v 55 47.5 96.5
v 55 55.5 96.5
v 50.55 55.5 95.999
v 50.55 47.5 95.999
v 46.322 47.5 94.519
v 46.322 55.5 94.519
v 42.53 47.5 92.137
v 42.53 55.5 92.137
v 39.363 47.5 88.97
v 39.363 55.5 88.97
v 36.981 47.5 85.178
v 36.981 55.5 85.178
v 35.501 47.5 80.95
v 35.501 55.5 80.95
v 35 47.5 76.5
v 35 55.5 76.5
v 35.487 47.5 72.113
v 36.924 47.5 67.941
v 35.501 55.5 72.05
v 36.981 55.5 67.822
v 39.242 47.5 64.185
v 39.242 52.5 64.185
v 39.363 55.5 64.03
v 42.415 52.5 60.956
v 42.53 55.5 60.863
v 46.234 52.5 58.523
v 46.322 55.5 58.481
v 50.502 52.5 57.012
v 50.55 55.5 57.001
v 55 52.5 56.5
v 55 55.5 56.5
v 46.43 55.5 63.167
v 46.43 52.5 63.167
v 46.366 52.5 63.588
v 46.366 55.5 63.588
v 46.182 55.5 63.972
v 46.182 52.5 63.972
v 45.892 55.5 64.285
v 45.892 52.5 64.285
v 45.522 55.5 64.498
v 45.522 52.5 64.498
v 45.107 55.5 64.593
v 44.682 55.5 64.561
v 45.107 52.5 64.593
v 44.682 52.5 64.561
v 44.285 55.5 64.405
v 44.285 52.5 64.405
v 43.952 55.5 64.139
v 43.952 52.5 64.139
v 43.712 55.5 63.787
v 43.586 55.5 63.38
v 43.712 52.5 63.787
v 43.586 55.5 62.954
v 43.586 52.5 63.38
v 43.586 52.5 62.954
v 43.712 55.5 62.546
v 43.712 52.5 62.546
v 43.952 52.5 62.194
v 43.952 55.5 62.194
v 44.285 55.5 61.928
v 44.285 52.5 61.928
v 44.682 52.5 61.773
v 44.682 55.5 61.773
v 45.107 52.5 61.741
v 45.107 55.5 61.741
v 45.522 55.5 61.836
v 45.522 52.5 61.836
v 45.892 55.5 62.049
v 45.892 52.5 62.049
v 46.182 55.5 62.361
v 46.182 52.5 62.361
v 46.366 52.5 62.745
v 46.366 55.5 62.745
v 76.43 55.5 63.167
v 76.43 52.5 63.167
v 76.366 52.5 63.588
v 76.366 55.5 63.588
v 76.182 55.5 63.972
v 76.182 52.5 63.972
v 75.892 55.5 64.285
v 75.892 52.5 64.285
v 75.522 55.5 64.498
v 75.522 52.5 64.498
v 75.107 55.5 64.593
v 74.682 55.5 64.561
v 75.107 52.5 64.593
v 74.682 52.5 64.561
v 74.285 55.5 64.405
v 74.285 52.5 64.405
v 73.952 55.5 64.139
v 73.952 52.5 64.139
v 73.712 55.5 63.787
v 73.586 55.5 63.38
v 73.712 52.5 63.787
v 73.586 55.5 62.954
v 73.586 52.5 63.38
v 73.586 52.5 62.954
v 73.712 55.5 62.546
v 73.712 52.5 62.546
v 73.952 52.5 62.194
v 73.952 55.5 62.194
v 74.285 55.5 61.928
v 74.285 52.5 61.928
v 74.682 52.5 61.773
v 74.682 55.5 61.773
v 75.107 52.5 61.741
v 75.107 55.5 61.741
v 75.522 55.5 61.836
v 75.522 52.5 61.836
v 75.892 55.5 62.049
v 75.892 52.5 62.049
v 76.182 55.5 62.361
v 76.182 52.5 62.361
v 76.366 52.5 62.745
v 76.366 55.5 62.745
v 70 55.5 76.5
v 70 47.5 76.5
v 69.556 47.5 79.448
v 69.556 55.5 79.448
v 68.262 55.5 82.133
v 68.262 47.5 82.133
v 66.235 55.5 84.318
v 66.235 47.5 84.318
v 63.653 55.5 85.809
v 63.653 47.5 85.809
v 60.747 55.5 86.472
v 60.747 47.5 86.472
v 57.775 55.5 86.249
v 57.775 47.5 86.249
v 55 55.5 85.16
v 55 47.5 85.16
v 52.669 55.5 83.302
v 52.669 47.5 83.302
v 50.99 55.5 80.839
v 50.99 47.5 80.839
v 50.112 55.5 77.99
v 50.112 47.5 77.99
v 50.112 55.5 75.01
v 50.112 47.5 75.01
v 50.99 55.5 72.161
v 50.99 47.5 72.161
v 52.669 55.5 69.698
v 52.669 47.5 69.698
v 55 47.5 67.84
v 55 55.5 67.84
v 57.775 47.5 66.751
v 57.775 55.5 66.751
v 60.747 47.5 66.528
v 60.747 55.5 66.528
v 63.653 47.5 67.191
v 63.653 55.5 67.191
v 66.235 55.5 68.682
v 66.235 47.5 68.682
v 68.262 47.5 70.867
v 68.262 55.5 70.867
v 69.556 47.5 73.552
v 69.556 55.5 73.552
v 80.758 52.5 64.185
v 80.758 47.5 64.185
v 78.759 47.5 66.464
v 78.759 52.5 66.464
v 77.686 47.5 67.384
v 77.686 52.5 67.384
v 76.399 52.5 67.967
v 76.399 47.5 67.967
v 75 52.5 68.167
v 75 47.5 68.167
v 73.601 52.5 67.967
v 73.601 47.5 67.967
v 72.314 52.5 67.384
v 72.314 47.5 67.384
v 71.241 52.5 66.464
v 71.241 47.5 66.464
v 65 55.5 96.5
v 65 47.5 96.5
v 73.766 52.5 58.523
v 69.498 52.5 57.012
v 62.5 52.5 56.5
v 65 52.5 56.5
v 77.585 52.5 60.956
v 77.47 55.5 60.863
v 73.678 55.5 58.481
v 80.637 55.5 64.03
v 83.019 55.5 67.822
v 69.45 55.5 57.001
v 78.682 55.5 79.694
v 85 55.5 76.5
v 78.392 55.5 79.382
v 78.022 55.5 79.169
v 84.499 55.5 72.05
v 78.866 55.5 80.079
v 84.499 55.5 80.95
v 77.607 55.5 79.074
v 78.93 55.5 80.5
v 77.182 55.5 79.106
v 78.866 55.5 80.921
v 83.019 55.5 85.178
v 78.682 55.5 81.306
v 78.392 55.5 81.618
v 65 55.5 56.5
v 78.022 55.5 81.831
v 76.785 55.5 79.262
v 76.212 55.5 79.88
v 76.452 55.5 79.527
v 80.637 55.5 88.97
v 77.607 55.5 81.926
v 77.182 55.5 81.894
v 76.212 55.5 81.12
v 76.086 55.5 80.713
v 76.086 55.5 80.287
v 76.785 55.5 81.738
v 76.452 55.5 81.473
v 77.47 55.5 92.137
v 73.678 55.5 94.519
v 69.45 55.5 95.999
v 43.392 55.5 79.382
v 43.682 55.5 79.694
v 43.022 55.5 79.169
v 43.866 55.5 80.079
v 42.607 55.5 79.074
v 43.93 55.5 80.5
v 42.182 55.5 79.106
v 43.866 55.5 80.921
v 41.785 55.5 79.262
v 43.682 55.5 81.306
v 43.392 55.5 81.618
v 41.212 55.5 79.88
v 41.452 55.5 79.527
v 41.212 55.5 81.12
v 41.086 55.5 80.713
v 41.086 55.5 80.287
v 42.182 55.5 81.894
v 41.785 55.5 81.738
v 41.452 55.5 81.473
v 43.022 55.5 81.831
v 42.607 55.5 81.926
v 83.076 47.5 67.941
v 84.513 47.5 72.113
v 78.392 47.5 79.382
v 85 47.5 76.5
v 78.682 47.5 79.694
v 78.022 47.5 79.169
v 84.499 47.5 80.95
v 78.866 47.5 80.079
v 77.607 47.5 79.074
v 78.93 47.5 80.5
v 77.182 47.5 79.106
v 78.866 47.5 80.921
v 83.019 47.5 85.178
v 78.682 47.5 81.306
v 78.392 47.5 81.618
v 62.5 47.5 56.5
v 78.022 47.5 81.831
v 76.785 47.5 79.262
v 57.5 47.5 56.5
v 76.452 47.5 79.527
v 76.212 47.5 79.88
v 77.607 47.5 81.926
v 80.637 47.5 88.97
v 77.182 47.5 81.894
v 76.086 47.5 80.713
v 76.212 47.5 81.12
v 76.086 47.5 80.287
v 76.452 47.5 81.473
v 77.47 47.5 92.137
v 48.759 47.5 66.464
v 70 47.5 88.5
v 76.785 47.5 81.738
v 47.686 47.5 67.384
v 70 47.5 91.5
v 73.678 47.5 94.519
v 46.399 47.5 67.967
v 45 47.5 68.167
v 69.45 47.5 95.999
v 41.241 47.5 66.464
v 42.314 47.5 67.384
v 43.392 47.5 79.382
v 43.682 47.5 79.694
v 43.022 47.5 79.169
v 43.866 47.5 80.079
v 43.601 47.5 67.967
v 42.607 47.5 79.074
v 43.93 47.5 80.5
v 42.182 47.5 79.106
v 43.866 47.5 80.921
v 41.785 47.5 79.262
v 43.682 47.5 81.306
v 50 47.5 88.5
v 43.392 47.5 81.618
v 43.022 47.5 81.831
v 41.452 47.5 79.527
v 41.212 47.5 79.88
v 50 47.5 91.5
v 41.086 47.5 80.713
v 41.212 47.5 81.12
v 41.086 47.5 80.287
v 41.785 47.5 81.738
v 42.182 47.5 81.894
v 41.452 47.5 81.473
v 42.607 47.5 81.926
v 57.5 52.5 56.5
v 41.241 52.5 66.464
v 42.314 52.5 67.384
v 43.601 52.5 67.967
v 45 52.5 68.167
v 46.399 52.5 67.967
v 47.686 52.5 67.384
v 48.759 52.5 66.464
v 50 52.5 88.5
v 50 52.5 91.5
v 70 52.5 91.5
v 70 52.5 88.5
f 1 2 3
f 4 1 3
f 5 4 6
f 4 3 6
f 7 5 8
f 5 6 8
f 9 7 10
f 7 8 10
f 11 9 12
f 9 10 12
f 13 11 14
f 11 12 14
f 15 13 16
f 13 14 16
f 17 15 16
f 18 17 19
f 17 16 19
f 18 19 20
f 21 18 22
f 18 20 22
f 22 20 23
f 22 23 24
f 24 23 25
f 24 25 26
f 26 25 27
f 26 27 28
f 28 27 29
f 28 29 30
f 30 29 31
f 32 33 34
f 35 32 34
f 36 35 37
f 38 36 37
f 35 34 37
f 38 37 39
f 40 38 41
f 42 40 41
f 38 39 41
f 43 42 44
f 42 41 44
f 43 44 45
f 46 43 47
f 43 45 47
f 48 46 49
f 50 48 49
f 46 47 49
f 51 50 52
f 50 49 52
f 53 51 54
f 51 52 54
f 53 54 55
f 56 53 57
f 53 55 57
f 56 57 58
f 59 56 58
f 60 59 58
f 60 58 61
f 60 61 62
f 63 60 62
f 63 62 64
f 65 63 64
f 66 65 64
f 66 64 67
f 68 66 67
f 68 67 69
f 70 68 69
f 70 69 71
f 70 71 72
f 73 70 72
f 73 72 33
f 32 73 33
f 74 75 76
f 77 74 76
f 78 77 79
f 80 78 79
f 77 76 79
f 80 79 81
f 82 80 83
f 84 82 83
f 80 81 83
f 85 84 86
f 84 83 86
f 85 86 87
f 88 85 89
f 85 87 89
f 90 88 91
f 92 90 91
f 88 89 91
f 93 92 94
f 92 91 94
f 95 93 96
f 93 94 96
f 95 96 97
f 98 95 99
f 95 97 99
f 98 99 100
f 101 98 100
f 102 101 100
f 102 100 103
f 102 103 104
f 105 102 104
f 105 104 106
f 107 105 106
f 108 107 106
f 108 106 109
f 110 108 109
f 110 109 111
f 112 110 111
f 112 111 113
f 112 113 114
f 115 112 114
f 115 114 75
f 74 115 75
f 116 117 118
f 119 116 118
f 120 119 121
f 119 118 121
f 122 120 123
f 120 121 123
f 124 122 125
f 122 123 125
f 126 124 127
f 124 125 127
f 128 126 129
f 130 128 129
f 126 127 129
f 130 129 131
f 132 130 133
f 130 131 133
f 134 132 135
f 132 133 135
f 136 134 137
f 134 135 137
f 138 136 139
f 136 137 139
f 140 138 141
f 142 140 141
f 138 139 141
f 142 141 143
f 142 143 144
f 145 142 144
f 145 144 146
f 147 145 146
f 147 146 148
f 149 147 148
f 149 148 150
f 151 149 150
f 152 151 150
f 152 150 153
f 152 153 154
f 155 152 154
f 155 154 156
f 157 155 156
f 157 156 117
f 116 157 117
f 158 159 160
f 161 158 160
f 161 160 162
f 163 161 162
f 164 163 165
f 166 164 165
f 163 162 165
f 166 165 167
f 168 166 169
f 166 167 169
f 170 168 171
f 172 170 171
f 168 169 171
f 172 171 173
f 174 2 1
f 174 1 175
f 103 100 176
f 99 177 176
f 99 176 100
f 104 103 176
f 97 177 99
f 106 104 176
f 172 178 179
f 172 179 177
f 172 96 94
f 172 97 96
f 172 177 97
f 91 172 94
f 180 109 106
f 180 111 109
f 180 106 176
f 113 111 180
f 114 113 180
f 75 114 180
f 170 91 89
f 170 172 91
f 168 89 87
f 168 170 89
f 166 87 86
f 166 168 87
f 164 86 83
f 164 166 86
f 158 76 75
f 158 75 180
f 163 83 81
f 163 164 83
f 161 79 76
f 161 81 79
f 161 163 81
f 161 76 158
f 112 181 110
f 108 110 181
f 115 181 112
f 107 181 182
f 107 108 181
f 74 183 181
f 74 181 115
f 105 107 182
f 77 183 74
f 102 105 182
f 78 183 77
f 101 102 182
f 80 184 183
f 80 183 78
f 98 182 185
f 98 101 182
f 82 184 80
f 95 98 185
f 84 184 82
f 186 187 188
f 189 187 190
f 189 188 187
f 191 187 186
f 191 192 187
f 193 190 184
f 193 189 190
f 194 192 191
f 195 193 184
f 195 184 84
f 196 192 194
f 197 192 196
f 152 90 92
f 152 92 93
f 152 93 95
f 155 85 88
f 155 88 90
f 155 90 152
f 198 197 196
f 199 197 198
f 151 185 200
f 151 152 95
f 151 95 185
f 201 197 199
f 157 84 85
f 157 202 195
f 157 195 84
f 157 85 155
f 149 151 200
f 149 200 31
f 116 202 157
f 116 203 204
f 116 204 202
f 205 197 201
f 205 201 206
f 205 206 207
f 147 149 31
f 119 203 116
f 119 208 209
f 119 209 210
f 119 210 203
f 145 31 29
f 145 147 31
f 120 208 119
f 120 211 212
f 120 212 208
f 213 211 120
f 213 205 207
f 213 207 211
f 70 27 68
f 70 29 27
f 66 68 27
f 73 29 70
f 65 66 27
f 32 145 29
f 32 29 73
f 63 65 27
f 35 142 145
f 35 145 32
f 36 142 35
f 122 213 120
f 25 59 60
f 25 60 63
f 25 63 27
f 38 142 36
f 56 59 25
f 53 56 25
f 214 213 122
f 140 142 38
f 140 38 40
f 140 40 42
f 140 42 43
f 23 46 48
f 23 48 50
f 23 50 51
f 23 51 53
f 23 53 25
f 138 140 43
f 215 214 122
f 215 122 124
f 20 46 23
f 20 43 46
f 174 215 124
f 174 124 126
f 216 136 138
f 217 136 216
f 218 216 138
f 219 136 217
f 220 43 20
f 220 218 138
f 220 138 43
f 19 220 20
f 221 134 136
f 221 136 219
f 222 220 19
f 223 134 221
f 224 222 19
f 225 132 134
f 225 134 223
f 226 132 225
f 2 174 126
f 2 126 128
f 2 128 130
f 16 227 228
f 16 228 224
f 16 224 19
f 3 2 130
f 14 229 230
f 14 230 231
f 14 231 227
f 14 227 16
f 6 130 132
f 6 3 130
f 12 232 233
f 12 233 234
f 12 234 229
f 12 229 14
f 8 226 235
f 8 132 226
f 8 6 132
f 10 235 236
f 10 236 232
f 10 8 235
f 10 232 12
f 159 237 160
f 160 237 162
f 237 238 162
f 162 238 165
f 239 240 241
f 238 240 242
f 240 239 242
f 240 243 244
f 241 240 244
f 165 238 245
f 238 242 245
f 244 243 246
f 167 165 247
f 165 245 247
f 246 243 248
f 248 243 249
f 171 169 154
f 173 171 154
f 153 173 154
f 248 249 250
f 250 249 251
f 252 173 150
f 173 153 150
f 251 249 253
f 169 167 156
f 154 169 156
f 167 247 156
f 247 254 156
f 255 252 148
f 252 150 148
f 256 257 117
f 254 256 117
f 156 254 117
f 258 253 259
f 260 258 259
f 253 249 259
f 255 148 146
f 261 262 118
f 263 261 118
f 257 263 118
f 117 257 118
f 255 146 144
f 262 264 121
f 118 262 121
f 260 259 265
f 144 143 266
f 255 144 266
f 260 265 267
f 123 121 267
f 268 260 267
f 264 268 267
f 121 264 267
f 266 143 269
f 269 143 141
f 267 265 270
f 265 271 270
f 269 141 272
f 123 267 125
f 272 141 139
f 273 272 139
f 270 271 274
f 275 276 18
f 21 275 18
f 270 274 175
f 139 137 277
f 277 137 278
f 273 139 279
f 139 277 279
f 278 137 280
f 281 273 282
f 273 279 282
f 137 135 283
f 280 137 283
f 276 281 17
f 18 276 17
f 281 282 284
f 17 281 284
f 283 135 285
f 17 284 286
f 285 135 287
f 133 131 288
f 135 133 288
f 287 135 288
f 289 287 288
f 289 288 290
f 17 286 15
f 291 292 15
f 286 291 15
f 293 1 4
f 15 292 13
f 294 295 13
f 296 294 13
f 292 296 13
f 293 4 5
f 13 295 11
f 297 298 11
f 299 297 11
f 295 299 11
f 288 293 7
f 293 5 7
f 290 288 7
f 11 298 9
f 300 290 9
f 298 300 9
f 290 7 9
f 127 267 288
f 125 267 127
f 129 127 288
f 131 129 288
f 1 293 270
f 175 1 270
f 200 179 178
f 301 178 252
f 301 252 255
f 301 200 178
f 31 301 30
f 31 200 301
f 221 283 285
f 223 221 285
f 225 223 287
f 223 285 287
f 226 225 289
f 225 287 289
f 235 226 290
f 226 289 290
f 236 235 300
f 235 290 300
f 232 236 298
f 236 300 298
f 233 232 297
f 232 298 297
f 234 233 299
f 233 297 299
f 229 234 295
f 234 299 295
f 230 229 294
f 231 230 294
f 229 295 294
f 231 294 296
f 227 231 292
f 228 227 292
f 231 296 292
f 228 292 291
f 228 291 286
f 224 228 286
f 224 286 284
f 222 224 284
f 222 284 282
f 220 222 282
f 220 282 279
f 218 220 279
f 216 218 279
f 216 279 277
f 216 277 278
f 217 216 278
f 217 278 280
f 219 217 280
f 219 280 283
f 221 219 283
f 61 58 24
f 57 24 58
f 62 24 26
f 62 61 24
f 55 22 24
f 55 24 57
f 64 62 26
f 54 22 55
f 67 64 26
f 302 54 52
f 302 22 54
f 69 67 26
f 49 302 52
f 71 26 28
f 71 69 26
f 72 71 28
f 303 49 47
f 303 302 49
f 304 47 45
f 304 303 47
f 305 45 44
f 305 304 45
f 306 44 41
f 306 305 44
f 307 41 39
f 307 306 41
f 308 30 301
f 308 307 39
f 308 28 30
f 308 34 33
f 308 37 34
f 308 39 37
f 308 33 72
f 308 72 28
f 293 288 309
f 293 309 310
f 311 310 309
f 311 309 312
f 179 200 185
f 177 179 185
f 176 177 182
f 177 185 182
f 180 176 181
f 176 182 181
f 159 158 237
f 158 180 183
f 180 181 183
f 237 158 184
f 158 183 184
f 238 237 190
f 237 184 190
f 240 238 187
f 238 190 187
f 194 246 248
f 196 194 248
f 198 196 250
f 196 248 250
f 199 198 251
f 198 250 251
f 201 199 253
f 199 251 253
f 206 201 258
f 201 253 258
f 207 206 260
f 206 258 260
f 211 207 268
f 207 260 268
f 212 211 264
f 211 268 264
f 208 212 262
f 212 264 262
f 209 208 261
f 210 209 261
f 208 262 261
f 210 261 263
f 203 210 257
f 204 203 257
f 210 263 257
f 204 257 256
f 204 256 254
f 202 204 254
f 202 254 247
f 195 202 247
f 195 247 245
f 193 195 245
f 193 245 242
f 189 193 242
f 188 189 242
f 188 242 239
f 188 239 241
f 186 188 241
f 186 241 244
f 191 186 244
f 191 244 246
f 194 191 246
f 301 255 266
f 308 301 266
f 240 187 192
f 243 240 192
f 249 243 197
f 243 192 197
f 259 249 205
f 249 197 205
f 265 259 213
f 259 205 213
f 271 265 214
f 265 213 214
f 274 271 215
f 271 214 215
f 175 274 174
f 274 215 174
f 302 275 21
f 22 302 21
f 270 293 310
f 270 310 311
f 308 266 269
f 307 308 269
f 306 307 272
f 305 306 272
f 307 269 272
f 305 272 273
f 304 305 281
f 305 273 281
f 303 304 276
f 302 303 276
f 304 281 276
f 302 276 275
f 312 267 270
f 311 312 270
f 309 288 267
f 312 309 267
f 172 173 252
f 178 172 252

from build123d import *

# Parameters (mm, degrees)
PAD005_DEPTH    = 8
SKETCH018_W     = 20
SKETCH018_H     = 3
POCKET011_DEPTH = 5
SKETCH019_R     = 10
SKETCH019_R_2   = 1.43
POCKET012_DEPTH = 10


with BuildPart() as part:
    # Sketch017 → Pad005 (new body)
    with BuildSketch(Plane.XZ):
        with BuildLine():
            Line((-4.99996, 20), (4.99996, 20))
            ThreePointArc((25, 0), (19.142122, 14.14215), (4.99996, 20))
            ThreePointArc((4.99996, -20), (19.142122, -14.14215), (25, 0))
            Line((4.99996, -20), (-4.99996, -20))
            ThreePointArc((-25, 0), (-19.142122, -14.14215), (-4.99996, -20))
            ThreePointArc((-4.99996, 20), (-19.142122, 14.14215), (-25, 0))
        make_face()
    extrude(amount=PAD005_DEPTH)

    # Sketch018 (on Face8 of Pad005) → Pocket011 (cut)
    with BuildSketch(Plane.XZ.offset(8)):
        with BuildLine():
            ThreePointArc((-11.241388, -10.035935), (-15, -8.333333), (-18.758612, -10.035935))
            Line((-18.758612, -10.035935), (-27.5, -20))
            ThreePointArc((-27.5, -20), (-15, -47.594619), (-2.5, -20))
            Line((-2.5, -20), (-11.241388, -10.035935))
        make_face()
        with BuildLine():
            ThreePointArc((18.758612, -10.035935), (15, -8.333333), (11.241388, -10.035935))
            Line((11.241388, -10.035935), (2.5, -20))
            ThreePointArc((2.5, -20), (15, -47.594619), (27.5, -20))
            Line((27.5, -20), (18.758612, -10.035935))
        make_face()
        with Locations((0, 13.5)):
            Rectangle(SKETCH018_W, SKETCH018_H)
    extrude(amount=-POCKET011_DEPTH, mode=Mode.SUBTRACT)

    # Sketch019 (on Face5 of Pocket011) → Pocket012 (cut)
    with BuildSketch(Plane.XZ.offset(8)):
        Circle(SKETCH019_R)
        with Locations((-15, -13.333333)):
            Circle(SKETCH019_R_2)
        with Locations((15, -13.333333)):
            Circle(SKETCH019_R_2)
        with Locations((-17.5, 4)):
            Circle(SKETCH019_R_2)
        with Locations((17.5, 4)):
            Circle(SKETCH019_R_2)
    extrude(amount=-POCKET012_DEPTH, mode=Mode.SUBTRACT)


with BuildPart() as part_1:
    # Body005 placement: moved
    add(part.part.moved(Location((60, 55.5, 76.5))))


solid = part_1.part
